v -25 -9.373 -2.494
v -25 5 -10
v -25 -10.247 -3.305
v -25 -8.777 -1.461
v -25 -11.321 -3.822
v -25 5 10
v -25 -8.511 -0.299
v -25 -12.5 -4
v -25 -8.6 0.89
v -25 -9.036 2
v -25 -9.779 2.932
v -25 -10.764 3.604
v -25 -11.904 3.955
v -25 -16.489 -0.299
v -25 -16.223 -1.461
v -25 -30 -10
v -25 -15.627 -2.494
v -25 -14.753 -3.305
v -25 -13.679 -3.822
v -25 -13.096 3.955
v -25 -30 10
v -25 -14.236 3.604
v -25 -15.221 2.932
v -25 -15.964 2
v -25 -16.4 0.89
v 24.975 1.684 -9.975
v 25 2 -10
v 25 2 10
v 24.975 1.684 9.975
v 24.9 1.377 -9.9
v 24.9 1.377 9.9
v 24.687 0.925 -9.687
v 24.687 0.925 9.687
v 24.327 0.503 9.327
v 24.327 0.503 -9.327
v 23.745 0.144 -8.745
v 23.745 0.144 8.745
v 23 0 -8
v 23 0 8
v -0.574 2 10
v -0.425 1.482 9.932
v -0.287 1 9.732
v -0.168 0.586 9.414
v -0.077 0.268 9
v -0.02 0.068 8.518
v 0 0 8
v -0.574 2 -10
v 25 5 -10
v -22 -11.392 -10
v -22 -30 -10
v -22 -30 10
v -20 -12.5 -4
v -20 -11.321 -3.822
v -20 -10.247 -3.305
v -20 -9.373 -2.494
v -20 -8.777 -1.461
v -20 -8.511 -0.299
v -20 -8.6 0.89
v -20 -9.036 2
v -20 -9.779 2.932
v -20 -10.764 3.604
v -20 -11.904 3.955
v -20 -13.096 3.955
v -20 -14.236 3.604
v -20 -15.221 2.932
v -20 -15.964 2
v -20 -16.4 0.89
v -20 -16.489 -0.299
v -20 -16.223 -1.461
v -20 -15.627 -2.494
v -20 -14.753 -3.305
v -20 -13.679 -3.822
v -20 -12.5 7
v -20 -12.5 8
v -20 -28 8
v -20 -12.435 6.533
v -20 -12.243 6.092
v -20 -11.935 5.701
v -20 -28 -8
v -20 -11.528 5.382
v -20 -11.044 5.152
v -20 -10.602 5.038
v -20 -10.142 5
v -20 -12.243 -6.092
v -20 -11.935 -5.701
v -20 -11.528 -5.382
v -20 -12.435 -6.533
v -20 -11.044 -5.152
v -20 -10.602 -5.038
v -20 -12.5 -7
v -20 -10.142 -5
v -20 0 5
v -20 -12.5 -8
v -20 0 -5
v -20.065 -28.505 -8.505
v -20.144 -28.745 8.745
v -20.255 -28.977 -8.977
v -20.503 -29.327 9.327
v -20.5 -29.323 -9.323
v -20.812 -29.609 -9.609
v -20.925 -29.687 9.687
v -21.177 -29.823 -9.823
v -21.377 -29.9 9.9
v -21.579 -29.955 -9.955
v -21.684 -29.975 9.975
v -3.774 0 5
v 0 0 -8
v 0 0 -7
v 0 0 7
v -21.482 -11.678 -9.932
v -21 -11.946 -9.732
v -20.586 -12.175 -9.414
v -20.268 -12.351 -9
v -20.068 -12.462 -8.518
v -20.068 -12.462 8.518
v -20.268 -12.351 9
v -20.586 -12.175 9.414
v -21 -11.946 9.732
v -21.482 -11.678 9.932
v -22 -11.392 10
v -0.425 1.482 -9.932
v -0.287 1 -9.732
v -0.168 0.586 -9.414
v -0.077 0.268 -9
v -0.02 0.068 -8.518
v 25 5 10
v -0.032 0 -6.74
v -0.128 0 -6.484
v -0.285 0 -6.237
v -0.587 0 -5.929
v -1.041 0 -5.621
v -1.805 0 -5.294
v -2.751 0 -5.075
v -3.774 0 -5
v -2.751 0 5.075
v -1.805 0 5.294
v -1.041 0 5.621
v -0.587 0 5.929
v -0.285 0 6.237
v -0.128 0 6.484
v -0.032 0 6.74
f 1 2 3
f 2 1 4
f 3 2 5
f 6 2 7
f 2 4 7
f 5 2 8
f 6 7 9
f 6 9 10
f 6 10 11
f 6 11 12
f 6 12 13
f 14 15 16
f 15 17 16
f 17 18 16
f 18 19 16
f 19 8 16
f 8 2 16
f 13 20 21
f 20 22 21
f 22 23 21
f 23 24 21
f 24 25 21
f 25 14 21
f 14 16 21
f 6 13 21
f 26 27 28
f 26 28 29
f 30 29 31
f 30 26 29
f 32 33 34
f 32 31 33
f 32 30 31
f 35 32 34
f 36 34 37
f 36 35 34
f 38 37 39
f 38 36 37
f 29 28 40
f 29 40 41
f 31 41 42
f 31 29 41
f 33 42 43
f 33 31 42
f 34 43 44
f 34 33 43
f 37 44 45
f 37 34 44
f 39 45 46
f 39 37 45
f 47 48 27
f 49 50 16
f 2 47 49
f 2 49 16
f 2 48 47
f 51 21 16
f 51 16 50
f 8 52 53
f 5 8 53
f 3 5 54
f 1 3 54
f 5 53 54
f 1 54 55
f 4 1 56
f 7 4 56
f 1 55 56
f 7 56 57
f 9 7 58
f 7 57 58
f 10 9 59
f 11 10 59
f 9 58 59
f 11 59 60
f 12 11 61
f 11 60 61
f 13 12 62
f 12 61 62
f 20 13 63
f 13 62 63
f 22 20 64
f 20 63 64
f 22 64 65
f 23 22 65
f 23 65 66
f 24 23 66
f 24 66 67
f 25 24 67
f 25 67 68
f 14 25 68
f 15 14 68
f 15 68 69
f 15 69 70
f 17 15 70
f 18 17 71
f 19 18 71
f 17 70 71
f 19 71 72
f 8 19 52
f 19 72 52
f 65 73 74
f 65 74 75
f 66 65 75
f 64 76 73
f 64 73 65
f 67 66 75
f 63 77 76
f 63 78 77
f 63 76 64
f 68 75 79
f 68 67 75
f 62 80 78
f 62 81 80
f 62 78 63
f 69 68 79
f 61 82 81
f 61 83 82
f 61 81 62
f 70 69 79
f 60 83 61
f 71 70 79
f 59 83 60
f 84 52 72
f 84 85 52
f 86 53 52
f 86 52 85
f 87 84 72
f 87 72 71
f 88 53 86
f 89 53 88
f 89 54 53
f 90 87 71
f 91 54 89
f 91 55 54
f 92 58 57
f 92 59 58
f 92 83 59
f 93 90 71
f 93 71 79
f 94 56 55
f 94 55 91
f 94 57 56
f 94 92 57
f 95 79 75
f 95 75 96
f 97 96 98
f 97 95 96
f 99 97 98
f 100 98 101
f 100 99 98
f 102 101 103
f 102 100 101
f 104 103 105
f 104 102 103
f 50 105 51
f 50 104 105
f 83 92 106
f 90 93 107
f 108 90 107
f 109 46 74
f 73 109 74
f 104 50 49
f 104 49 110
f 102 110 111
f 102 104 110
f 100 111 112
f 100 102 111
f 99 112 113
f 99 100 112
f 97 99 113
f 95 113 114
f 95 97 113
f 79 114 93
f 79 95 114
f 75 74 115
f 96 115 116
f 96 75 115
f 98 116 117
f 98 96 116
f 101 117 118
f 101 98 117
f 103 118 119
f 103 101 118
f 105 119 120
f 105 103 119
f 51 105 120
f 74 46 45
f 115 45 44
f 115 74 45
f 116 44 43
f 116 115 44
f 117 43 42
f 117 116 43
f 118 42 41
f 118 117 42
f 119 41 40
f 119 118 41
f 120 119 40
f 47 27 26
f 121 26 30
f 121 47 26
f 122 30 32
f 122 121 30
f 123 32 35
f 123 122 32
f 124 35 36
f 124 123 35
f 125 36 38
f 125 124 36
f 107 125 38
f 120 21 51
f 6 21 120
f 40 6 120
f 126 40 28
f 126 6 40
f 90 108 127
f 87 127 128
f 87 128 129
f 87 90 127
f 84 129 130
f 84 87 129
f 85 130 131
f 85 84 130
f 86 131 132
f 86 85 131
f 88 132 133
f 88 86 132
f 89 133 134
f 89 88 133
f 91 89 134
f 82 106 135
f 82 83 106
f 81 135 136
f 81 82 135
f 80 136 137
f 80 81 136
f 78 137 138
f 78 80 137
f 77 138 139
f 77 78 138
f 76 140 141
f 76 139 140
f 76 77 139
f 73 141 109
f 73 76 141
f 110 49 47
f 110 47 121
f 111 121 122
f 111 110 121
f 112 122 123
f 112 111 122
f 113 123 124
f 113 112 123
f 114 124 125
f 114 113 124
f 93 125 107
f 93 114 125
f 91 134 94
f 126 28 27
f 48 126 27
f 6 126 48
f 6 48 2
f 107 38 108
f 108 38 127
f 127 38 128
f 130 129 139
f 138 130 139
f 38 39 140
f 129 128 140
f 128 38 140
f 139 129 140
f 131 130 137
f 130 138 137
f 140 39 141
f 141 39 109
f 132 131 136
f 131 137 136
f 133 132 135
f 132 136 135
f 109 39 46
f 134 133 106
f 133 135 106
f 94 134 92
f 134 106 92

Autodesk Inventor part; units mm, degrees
ref_plane "YZ Plane" through (0, 0, 0) normal (1, 0, 0) x (0, 1, 0)
ref_plane "XZ Plane" through (0, 0, 0) normal (0, 1, 0) x (-1, 0, 0)
ref_plane "XY Plane" through (0, 0, 0) normal (0, 0, 1) x (1, 0, 0)
sketch "Sketch1" plane through (0, 0, 0) normal (0, 1, 0) x (-1, 0, 0)
  line L0 (25, 10) -> (-25, 10)
  line L1 (-25, 10) -> (-25, -10)
  line L2 (-25, -10) -> (25, -10)
  line L3 (25, -10) -> (25, 10)
  line L4 (25, 10) -> (-25, -10) construction
  line L5 (-25, 10) -> (25, -10) construction
  point P0 (0, 0)
  dimension "d0" = 50
  dimension "d1" = 20
extrude "Extrusion1" add sketch "Sketch1" along normal blind 5
sketch "Sketch2" plane through (0, 0, 0) normal (0, -1, 0) x (1, 0, 0)
  line L0 (-25, -10) -> (-25, 10) projected
  line L1 (-25, 10) -> (-20, 10)
  line L2 (-25, 10) -> (25, 10) projected
  line L3 (-20, 10) -> (-20, -10)
  line L4 (25, -10) -> (-25, -10) projected
  line L5 (-25, -10) -> (-20, -10)
  line L6 (-25, 10) -> (-25, -10)
  point P0 (0, 0)
  dimension "d4" = 5
extrude "Extrusion2" add sketch "Sketch2" along normal blind 30
sketch "Sketch3" plane through (-20, 0, 10) normal (1, 0, 0) x (0, 0, -1)
  point P0 (10, 0)
sketch "Sketch4" plane through (-25, 5, 10) normal (0, 0, 1) x (1, 0, 0)
  line L0 (5, -5) -> (50, -5) projected
  line L1 (50, -5) -> (50, 0) projected
  line L2 (0, 0) -> (50, 0) projected
  line L3 (0, -35) -> (0, 0) projected
  line L4 (5, -35) -> (0, -35) projected
  line L5 (5, -5) -> (5, -35) projected
  line L6 (25, -5) -> (5, -17.5)
  dimension "d7" = 10.6
extrude "Extrusion3" add sketch "Sketch4" against normal blind 5 contours L0 L6 L5
mirror "Mirror1" about plane through (0, 0, 0) normal (0, 0, 1) of "Extrusion3"
sketch "Sketch5" plane through (-20, -30, 10) normal (1, 0, 0) x (0, 0, -1)
  circle A0 centre (10, 17.5) radius 4
  line L0 (0, 30) -> (20, 30) projected
  line L1 (0, 17.5) -> (0, 0) projected
  point P0 (10, 30)
  point P1 (10, 30)
  dimension "d10" = 8
  dimension "d11" = 12.5
  dimension "d12" = 10
extrude "Extrusion4" cut sketch "Sketch5" against normal blind 5
fillet "Fillet1" radius 2 2 edges at (-10, -6.25, 5) (-10, -6.25, -5)
fillet "Fillet2" radius 2 8 edges at (12.5, 0, -10) (-10, -6.25, -10) (25, 0, 0) (12.5, 0, 10) (-10, -6.25, 10) (-20, -21.25, -10) (-20, -30, 0) (-20, -21.25, 10)
